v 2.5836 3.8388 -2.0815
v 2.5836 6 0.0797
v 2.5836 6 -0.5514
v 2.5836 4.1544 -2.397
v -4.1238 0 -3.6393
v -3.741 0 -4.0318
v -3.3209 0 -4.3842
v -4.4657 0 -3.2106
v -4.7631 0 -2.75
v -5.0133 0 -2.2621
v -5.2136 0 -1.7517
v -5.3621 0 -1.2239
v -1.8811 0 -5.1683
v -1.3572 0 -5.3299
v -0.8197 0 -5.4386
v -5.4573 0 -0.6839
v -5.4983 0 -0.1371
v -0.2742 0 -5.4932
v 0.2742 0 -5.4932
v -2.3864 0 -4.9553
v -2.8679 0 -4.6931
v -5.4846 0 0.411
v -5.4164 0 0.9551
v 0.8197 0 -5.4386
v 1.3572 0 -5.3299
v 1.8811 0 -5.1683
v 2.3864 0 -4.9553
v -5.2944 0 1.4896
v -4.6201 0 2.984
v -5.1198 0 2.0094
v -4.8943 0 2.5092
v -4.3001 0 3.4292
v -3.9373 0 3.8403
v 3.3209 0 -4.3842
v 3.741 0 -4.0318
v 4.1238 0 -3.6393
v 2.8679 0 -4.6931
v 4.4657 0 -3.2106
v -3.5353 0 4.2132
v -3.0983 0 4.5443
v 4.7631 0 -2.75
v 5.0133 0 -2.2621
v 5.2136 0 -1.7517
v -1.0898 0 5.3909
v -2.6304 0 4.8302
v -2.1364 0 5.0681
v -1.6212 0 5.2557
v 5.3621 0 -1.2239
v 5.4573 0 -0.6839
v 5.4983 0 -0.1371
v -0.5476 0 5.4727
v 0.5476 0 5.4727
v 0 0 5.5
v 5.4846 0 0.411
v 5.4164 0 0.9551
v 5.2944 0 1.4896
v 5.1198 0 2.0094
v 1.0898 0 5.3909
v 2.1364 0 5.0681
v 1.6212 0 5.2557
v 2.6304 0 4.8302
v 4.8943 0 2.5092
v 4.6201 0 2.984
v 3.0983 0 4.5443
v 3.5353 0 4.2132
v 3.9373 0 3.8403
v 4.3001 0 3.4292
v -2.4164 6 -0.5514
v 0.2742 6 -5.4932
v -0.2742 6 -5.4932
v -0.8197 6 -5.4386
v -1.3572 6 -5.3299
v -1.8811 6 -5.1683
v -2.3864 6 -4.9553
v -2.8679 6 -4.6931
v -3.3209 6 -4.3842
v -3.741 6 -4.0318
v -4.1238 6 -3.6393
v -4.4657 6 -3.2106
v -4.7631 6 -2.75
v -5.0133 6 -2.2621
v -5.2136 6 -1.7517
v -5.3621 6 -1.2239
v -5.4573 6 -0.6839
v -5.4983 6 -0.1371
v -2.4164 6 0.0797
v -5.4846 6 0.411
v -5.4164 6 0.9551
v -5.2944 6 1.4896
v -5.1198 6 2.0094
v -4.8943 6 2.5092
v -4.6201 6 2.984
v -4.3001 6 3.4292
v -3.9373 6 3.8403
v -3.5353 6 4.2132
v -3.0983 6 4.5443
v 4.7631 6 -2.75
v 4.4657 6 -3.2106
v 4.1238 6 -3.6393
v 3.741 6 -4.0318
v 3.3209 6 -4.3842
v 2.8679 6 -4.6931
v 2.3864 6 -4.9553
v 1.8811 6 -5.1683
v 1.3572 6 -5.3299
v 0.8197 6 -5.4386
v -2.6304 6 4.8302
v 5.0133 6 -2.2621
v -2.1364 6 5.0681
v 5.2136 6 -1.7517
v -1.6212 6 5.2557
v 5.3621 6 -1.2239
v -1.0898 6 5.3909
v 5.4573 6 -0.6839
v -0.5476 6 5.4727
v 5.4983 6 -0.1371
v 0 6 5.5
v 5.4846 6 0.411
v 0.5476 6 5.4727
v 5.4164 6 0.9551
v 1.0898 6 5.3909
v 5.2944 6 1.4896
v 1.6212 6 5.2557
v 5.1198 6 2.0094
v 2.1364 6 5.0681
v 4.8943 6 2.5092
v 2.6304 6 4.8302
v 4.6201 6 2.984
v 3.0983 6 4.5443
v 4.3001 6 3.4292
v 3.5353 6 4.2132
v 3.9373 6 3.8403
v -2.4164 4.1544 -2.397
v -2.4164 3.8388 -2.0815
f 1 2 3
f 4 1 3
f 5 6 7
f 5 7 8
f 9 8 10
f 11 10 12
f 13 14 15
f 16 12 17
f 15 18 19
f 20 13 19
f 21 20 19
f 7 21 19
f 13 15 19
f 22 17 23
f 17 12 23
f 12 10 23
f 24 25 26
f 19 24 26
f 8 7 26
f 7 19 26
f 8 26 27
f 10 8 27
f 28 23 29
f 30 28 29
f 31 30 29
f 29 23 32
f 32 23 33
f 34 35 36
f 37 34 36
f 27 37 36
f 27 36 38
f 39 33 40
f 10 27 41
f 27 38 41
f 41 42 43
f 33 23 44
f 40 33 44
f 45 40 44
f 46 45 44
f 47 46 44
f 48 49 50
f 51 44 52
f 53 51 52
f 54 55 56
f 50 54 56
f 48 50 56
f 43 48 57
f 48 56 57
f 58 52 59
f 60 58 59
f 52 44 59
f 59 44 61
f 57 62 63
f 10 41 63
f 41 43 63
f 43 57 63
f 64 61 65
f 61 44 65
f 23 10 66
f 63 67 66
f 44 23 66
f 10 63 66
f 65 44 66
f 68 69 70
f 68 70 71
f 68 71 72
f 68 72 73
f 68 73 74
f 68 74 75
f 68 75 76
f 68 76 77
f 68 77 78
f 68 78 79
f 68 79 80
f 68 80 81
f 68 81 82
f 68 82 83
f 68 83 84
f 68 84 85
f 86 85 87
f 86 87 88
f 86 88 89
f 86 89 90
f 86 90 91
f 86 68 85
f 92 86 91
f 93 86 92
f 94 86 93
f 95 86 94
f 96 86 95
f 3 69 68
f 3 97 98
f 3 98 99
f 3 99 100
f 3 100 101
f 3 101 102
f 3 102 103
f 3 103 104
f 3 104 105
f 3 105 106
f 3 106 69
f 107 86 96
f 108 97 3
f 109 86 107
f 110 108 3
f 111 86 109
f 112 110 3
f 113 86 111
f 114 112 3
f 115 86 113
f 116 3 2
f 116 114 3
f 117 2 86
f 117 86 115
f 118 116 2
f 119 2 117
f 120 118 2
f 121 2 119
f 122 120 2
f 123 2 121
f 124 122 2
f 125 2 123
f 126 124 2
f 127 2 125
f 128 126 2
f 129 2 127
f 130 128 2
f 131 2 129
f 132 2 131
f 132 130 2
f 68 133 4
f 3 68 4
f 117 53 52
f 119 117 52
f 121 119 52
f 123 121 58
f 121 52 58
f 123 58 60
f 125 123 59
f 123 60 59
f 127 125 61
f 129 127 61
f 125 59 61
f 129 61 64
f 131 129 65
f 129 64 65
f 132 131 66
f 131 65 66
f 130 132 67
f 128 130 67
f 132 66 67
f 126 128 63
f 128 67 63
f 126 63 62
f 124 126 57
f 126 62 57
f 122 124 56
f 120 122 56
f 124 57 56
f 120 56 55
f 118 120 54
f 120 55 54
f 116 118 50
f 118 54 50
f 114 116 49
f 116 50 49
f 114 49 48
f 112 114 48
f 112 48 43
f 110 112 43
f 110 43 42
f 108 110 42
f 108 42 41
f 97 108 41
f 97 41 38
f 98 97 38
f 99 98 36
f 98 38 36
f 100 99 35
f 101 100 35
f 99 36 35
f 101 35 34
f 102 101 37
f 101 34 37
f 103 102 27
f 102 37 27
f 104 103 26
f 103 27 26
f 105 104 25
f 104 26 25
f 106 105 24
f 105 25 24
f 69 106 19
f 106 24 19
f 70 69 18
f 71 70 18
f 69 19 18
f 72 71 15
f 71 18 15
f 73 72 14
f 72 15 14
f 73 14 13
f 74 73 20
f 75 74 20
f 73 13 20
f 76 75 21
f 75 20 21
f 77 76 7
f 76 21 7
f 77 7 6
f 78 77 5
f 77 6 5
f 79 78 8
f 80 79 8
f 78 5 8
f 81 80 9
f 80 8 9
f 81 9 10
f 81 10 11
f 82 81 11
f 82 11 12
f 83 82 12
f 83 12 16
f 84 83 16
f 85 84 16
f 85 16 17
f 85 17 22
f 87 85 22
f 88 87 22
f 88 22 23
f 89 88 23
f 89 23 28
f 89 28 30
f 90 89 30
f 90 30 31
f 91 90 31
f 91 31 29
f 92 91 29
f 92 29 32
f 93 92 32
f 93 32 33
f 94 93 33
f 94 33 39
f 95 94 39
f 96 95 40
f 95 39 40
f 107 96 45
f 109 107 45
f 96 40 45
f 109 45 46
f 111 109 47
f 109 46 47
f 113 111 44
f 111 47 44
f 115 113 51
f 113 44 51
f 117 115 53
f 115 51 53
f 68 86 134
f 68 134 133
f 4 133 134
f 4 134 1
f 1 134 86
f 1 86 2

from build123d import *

# Parameters (mm, degrees)
SKETCH1_R               = 5.5
BOSS_EXTRUDE1_DEPTH     = 6
CUT_EXTRUDE1_DEPTH      = 3
CUT_EXTRUDE1_DEPTH_BACK = 3
SKETCH3_W               = 5
SKETCH3_H               = 0.446225232


with BuildPart() as part:
    # Sketch1 → Boss-Extrude1 (new body)
    with BuildSketch(Plane(origin=(0, 0, 0), x_dir=(1, 0, 0), z_dir=(0, 1, 0))):
        Circle(SKETCH1_R)
    extrude(amount=BOSS_EXTRUDE1_DEPTH)

    # Sketch3 → Cut-Extrude1 (cut, two sides: drawn at the far end of the back side and taken through both)
    with BuildSketch(Plane(origin=(0, 3, 3), x_dir=(1, 0, 0), z_dir=(0, 0.7071067811865464, 0.7071067811865488)).offset(-CUT_EXTRUDE1_DEPTH_BACK)):
        with Locations((0.083557951, 4.409395003)):
            Rectangle(SKETCH3_W, SKETCH3_H)
    extrude(amount=CUT_EXTRUDE1_DEPTH + CUT_EXTRUDE1_DEPTH_BACK, mode=Mode.SUBTRACT)


solid = part.part
